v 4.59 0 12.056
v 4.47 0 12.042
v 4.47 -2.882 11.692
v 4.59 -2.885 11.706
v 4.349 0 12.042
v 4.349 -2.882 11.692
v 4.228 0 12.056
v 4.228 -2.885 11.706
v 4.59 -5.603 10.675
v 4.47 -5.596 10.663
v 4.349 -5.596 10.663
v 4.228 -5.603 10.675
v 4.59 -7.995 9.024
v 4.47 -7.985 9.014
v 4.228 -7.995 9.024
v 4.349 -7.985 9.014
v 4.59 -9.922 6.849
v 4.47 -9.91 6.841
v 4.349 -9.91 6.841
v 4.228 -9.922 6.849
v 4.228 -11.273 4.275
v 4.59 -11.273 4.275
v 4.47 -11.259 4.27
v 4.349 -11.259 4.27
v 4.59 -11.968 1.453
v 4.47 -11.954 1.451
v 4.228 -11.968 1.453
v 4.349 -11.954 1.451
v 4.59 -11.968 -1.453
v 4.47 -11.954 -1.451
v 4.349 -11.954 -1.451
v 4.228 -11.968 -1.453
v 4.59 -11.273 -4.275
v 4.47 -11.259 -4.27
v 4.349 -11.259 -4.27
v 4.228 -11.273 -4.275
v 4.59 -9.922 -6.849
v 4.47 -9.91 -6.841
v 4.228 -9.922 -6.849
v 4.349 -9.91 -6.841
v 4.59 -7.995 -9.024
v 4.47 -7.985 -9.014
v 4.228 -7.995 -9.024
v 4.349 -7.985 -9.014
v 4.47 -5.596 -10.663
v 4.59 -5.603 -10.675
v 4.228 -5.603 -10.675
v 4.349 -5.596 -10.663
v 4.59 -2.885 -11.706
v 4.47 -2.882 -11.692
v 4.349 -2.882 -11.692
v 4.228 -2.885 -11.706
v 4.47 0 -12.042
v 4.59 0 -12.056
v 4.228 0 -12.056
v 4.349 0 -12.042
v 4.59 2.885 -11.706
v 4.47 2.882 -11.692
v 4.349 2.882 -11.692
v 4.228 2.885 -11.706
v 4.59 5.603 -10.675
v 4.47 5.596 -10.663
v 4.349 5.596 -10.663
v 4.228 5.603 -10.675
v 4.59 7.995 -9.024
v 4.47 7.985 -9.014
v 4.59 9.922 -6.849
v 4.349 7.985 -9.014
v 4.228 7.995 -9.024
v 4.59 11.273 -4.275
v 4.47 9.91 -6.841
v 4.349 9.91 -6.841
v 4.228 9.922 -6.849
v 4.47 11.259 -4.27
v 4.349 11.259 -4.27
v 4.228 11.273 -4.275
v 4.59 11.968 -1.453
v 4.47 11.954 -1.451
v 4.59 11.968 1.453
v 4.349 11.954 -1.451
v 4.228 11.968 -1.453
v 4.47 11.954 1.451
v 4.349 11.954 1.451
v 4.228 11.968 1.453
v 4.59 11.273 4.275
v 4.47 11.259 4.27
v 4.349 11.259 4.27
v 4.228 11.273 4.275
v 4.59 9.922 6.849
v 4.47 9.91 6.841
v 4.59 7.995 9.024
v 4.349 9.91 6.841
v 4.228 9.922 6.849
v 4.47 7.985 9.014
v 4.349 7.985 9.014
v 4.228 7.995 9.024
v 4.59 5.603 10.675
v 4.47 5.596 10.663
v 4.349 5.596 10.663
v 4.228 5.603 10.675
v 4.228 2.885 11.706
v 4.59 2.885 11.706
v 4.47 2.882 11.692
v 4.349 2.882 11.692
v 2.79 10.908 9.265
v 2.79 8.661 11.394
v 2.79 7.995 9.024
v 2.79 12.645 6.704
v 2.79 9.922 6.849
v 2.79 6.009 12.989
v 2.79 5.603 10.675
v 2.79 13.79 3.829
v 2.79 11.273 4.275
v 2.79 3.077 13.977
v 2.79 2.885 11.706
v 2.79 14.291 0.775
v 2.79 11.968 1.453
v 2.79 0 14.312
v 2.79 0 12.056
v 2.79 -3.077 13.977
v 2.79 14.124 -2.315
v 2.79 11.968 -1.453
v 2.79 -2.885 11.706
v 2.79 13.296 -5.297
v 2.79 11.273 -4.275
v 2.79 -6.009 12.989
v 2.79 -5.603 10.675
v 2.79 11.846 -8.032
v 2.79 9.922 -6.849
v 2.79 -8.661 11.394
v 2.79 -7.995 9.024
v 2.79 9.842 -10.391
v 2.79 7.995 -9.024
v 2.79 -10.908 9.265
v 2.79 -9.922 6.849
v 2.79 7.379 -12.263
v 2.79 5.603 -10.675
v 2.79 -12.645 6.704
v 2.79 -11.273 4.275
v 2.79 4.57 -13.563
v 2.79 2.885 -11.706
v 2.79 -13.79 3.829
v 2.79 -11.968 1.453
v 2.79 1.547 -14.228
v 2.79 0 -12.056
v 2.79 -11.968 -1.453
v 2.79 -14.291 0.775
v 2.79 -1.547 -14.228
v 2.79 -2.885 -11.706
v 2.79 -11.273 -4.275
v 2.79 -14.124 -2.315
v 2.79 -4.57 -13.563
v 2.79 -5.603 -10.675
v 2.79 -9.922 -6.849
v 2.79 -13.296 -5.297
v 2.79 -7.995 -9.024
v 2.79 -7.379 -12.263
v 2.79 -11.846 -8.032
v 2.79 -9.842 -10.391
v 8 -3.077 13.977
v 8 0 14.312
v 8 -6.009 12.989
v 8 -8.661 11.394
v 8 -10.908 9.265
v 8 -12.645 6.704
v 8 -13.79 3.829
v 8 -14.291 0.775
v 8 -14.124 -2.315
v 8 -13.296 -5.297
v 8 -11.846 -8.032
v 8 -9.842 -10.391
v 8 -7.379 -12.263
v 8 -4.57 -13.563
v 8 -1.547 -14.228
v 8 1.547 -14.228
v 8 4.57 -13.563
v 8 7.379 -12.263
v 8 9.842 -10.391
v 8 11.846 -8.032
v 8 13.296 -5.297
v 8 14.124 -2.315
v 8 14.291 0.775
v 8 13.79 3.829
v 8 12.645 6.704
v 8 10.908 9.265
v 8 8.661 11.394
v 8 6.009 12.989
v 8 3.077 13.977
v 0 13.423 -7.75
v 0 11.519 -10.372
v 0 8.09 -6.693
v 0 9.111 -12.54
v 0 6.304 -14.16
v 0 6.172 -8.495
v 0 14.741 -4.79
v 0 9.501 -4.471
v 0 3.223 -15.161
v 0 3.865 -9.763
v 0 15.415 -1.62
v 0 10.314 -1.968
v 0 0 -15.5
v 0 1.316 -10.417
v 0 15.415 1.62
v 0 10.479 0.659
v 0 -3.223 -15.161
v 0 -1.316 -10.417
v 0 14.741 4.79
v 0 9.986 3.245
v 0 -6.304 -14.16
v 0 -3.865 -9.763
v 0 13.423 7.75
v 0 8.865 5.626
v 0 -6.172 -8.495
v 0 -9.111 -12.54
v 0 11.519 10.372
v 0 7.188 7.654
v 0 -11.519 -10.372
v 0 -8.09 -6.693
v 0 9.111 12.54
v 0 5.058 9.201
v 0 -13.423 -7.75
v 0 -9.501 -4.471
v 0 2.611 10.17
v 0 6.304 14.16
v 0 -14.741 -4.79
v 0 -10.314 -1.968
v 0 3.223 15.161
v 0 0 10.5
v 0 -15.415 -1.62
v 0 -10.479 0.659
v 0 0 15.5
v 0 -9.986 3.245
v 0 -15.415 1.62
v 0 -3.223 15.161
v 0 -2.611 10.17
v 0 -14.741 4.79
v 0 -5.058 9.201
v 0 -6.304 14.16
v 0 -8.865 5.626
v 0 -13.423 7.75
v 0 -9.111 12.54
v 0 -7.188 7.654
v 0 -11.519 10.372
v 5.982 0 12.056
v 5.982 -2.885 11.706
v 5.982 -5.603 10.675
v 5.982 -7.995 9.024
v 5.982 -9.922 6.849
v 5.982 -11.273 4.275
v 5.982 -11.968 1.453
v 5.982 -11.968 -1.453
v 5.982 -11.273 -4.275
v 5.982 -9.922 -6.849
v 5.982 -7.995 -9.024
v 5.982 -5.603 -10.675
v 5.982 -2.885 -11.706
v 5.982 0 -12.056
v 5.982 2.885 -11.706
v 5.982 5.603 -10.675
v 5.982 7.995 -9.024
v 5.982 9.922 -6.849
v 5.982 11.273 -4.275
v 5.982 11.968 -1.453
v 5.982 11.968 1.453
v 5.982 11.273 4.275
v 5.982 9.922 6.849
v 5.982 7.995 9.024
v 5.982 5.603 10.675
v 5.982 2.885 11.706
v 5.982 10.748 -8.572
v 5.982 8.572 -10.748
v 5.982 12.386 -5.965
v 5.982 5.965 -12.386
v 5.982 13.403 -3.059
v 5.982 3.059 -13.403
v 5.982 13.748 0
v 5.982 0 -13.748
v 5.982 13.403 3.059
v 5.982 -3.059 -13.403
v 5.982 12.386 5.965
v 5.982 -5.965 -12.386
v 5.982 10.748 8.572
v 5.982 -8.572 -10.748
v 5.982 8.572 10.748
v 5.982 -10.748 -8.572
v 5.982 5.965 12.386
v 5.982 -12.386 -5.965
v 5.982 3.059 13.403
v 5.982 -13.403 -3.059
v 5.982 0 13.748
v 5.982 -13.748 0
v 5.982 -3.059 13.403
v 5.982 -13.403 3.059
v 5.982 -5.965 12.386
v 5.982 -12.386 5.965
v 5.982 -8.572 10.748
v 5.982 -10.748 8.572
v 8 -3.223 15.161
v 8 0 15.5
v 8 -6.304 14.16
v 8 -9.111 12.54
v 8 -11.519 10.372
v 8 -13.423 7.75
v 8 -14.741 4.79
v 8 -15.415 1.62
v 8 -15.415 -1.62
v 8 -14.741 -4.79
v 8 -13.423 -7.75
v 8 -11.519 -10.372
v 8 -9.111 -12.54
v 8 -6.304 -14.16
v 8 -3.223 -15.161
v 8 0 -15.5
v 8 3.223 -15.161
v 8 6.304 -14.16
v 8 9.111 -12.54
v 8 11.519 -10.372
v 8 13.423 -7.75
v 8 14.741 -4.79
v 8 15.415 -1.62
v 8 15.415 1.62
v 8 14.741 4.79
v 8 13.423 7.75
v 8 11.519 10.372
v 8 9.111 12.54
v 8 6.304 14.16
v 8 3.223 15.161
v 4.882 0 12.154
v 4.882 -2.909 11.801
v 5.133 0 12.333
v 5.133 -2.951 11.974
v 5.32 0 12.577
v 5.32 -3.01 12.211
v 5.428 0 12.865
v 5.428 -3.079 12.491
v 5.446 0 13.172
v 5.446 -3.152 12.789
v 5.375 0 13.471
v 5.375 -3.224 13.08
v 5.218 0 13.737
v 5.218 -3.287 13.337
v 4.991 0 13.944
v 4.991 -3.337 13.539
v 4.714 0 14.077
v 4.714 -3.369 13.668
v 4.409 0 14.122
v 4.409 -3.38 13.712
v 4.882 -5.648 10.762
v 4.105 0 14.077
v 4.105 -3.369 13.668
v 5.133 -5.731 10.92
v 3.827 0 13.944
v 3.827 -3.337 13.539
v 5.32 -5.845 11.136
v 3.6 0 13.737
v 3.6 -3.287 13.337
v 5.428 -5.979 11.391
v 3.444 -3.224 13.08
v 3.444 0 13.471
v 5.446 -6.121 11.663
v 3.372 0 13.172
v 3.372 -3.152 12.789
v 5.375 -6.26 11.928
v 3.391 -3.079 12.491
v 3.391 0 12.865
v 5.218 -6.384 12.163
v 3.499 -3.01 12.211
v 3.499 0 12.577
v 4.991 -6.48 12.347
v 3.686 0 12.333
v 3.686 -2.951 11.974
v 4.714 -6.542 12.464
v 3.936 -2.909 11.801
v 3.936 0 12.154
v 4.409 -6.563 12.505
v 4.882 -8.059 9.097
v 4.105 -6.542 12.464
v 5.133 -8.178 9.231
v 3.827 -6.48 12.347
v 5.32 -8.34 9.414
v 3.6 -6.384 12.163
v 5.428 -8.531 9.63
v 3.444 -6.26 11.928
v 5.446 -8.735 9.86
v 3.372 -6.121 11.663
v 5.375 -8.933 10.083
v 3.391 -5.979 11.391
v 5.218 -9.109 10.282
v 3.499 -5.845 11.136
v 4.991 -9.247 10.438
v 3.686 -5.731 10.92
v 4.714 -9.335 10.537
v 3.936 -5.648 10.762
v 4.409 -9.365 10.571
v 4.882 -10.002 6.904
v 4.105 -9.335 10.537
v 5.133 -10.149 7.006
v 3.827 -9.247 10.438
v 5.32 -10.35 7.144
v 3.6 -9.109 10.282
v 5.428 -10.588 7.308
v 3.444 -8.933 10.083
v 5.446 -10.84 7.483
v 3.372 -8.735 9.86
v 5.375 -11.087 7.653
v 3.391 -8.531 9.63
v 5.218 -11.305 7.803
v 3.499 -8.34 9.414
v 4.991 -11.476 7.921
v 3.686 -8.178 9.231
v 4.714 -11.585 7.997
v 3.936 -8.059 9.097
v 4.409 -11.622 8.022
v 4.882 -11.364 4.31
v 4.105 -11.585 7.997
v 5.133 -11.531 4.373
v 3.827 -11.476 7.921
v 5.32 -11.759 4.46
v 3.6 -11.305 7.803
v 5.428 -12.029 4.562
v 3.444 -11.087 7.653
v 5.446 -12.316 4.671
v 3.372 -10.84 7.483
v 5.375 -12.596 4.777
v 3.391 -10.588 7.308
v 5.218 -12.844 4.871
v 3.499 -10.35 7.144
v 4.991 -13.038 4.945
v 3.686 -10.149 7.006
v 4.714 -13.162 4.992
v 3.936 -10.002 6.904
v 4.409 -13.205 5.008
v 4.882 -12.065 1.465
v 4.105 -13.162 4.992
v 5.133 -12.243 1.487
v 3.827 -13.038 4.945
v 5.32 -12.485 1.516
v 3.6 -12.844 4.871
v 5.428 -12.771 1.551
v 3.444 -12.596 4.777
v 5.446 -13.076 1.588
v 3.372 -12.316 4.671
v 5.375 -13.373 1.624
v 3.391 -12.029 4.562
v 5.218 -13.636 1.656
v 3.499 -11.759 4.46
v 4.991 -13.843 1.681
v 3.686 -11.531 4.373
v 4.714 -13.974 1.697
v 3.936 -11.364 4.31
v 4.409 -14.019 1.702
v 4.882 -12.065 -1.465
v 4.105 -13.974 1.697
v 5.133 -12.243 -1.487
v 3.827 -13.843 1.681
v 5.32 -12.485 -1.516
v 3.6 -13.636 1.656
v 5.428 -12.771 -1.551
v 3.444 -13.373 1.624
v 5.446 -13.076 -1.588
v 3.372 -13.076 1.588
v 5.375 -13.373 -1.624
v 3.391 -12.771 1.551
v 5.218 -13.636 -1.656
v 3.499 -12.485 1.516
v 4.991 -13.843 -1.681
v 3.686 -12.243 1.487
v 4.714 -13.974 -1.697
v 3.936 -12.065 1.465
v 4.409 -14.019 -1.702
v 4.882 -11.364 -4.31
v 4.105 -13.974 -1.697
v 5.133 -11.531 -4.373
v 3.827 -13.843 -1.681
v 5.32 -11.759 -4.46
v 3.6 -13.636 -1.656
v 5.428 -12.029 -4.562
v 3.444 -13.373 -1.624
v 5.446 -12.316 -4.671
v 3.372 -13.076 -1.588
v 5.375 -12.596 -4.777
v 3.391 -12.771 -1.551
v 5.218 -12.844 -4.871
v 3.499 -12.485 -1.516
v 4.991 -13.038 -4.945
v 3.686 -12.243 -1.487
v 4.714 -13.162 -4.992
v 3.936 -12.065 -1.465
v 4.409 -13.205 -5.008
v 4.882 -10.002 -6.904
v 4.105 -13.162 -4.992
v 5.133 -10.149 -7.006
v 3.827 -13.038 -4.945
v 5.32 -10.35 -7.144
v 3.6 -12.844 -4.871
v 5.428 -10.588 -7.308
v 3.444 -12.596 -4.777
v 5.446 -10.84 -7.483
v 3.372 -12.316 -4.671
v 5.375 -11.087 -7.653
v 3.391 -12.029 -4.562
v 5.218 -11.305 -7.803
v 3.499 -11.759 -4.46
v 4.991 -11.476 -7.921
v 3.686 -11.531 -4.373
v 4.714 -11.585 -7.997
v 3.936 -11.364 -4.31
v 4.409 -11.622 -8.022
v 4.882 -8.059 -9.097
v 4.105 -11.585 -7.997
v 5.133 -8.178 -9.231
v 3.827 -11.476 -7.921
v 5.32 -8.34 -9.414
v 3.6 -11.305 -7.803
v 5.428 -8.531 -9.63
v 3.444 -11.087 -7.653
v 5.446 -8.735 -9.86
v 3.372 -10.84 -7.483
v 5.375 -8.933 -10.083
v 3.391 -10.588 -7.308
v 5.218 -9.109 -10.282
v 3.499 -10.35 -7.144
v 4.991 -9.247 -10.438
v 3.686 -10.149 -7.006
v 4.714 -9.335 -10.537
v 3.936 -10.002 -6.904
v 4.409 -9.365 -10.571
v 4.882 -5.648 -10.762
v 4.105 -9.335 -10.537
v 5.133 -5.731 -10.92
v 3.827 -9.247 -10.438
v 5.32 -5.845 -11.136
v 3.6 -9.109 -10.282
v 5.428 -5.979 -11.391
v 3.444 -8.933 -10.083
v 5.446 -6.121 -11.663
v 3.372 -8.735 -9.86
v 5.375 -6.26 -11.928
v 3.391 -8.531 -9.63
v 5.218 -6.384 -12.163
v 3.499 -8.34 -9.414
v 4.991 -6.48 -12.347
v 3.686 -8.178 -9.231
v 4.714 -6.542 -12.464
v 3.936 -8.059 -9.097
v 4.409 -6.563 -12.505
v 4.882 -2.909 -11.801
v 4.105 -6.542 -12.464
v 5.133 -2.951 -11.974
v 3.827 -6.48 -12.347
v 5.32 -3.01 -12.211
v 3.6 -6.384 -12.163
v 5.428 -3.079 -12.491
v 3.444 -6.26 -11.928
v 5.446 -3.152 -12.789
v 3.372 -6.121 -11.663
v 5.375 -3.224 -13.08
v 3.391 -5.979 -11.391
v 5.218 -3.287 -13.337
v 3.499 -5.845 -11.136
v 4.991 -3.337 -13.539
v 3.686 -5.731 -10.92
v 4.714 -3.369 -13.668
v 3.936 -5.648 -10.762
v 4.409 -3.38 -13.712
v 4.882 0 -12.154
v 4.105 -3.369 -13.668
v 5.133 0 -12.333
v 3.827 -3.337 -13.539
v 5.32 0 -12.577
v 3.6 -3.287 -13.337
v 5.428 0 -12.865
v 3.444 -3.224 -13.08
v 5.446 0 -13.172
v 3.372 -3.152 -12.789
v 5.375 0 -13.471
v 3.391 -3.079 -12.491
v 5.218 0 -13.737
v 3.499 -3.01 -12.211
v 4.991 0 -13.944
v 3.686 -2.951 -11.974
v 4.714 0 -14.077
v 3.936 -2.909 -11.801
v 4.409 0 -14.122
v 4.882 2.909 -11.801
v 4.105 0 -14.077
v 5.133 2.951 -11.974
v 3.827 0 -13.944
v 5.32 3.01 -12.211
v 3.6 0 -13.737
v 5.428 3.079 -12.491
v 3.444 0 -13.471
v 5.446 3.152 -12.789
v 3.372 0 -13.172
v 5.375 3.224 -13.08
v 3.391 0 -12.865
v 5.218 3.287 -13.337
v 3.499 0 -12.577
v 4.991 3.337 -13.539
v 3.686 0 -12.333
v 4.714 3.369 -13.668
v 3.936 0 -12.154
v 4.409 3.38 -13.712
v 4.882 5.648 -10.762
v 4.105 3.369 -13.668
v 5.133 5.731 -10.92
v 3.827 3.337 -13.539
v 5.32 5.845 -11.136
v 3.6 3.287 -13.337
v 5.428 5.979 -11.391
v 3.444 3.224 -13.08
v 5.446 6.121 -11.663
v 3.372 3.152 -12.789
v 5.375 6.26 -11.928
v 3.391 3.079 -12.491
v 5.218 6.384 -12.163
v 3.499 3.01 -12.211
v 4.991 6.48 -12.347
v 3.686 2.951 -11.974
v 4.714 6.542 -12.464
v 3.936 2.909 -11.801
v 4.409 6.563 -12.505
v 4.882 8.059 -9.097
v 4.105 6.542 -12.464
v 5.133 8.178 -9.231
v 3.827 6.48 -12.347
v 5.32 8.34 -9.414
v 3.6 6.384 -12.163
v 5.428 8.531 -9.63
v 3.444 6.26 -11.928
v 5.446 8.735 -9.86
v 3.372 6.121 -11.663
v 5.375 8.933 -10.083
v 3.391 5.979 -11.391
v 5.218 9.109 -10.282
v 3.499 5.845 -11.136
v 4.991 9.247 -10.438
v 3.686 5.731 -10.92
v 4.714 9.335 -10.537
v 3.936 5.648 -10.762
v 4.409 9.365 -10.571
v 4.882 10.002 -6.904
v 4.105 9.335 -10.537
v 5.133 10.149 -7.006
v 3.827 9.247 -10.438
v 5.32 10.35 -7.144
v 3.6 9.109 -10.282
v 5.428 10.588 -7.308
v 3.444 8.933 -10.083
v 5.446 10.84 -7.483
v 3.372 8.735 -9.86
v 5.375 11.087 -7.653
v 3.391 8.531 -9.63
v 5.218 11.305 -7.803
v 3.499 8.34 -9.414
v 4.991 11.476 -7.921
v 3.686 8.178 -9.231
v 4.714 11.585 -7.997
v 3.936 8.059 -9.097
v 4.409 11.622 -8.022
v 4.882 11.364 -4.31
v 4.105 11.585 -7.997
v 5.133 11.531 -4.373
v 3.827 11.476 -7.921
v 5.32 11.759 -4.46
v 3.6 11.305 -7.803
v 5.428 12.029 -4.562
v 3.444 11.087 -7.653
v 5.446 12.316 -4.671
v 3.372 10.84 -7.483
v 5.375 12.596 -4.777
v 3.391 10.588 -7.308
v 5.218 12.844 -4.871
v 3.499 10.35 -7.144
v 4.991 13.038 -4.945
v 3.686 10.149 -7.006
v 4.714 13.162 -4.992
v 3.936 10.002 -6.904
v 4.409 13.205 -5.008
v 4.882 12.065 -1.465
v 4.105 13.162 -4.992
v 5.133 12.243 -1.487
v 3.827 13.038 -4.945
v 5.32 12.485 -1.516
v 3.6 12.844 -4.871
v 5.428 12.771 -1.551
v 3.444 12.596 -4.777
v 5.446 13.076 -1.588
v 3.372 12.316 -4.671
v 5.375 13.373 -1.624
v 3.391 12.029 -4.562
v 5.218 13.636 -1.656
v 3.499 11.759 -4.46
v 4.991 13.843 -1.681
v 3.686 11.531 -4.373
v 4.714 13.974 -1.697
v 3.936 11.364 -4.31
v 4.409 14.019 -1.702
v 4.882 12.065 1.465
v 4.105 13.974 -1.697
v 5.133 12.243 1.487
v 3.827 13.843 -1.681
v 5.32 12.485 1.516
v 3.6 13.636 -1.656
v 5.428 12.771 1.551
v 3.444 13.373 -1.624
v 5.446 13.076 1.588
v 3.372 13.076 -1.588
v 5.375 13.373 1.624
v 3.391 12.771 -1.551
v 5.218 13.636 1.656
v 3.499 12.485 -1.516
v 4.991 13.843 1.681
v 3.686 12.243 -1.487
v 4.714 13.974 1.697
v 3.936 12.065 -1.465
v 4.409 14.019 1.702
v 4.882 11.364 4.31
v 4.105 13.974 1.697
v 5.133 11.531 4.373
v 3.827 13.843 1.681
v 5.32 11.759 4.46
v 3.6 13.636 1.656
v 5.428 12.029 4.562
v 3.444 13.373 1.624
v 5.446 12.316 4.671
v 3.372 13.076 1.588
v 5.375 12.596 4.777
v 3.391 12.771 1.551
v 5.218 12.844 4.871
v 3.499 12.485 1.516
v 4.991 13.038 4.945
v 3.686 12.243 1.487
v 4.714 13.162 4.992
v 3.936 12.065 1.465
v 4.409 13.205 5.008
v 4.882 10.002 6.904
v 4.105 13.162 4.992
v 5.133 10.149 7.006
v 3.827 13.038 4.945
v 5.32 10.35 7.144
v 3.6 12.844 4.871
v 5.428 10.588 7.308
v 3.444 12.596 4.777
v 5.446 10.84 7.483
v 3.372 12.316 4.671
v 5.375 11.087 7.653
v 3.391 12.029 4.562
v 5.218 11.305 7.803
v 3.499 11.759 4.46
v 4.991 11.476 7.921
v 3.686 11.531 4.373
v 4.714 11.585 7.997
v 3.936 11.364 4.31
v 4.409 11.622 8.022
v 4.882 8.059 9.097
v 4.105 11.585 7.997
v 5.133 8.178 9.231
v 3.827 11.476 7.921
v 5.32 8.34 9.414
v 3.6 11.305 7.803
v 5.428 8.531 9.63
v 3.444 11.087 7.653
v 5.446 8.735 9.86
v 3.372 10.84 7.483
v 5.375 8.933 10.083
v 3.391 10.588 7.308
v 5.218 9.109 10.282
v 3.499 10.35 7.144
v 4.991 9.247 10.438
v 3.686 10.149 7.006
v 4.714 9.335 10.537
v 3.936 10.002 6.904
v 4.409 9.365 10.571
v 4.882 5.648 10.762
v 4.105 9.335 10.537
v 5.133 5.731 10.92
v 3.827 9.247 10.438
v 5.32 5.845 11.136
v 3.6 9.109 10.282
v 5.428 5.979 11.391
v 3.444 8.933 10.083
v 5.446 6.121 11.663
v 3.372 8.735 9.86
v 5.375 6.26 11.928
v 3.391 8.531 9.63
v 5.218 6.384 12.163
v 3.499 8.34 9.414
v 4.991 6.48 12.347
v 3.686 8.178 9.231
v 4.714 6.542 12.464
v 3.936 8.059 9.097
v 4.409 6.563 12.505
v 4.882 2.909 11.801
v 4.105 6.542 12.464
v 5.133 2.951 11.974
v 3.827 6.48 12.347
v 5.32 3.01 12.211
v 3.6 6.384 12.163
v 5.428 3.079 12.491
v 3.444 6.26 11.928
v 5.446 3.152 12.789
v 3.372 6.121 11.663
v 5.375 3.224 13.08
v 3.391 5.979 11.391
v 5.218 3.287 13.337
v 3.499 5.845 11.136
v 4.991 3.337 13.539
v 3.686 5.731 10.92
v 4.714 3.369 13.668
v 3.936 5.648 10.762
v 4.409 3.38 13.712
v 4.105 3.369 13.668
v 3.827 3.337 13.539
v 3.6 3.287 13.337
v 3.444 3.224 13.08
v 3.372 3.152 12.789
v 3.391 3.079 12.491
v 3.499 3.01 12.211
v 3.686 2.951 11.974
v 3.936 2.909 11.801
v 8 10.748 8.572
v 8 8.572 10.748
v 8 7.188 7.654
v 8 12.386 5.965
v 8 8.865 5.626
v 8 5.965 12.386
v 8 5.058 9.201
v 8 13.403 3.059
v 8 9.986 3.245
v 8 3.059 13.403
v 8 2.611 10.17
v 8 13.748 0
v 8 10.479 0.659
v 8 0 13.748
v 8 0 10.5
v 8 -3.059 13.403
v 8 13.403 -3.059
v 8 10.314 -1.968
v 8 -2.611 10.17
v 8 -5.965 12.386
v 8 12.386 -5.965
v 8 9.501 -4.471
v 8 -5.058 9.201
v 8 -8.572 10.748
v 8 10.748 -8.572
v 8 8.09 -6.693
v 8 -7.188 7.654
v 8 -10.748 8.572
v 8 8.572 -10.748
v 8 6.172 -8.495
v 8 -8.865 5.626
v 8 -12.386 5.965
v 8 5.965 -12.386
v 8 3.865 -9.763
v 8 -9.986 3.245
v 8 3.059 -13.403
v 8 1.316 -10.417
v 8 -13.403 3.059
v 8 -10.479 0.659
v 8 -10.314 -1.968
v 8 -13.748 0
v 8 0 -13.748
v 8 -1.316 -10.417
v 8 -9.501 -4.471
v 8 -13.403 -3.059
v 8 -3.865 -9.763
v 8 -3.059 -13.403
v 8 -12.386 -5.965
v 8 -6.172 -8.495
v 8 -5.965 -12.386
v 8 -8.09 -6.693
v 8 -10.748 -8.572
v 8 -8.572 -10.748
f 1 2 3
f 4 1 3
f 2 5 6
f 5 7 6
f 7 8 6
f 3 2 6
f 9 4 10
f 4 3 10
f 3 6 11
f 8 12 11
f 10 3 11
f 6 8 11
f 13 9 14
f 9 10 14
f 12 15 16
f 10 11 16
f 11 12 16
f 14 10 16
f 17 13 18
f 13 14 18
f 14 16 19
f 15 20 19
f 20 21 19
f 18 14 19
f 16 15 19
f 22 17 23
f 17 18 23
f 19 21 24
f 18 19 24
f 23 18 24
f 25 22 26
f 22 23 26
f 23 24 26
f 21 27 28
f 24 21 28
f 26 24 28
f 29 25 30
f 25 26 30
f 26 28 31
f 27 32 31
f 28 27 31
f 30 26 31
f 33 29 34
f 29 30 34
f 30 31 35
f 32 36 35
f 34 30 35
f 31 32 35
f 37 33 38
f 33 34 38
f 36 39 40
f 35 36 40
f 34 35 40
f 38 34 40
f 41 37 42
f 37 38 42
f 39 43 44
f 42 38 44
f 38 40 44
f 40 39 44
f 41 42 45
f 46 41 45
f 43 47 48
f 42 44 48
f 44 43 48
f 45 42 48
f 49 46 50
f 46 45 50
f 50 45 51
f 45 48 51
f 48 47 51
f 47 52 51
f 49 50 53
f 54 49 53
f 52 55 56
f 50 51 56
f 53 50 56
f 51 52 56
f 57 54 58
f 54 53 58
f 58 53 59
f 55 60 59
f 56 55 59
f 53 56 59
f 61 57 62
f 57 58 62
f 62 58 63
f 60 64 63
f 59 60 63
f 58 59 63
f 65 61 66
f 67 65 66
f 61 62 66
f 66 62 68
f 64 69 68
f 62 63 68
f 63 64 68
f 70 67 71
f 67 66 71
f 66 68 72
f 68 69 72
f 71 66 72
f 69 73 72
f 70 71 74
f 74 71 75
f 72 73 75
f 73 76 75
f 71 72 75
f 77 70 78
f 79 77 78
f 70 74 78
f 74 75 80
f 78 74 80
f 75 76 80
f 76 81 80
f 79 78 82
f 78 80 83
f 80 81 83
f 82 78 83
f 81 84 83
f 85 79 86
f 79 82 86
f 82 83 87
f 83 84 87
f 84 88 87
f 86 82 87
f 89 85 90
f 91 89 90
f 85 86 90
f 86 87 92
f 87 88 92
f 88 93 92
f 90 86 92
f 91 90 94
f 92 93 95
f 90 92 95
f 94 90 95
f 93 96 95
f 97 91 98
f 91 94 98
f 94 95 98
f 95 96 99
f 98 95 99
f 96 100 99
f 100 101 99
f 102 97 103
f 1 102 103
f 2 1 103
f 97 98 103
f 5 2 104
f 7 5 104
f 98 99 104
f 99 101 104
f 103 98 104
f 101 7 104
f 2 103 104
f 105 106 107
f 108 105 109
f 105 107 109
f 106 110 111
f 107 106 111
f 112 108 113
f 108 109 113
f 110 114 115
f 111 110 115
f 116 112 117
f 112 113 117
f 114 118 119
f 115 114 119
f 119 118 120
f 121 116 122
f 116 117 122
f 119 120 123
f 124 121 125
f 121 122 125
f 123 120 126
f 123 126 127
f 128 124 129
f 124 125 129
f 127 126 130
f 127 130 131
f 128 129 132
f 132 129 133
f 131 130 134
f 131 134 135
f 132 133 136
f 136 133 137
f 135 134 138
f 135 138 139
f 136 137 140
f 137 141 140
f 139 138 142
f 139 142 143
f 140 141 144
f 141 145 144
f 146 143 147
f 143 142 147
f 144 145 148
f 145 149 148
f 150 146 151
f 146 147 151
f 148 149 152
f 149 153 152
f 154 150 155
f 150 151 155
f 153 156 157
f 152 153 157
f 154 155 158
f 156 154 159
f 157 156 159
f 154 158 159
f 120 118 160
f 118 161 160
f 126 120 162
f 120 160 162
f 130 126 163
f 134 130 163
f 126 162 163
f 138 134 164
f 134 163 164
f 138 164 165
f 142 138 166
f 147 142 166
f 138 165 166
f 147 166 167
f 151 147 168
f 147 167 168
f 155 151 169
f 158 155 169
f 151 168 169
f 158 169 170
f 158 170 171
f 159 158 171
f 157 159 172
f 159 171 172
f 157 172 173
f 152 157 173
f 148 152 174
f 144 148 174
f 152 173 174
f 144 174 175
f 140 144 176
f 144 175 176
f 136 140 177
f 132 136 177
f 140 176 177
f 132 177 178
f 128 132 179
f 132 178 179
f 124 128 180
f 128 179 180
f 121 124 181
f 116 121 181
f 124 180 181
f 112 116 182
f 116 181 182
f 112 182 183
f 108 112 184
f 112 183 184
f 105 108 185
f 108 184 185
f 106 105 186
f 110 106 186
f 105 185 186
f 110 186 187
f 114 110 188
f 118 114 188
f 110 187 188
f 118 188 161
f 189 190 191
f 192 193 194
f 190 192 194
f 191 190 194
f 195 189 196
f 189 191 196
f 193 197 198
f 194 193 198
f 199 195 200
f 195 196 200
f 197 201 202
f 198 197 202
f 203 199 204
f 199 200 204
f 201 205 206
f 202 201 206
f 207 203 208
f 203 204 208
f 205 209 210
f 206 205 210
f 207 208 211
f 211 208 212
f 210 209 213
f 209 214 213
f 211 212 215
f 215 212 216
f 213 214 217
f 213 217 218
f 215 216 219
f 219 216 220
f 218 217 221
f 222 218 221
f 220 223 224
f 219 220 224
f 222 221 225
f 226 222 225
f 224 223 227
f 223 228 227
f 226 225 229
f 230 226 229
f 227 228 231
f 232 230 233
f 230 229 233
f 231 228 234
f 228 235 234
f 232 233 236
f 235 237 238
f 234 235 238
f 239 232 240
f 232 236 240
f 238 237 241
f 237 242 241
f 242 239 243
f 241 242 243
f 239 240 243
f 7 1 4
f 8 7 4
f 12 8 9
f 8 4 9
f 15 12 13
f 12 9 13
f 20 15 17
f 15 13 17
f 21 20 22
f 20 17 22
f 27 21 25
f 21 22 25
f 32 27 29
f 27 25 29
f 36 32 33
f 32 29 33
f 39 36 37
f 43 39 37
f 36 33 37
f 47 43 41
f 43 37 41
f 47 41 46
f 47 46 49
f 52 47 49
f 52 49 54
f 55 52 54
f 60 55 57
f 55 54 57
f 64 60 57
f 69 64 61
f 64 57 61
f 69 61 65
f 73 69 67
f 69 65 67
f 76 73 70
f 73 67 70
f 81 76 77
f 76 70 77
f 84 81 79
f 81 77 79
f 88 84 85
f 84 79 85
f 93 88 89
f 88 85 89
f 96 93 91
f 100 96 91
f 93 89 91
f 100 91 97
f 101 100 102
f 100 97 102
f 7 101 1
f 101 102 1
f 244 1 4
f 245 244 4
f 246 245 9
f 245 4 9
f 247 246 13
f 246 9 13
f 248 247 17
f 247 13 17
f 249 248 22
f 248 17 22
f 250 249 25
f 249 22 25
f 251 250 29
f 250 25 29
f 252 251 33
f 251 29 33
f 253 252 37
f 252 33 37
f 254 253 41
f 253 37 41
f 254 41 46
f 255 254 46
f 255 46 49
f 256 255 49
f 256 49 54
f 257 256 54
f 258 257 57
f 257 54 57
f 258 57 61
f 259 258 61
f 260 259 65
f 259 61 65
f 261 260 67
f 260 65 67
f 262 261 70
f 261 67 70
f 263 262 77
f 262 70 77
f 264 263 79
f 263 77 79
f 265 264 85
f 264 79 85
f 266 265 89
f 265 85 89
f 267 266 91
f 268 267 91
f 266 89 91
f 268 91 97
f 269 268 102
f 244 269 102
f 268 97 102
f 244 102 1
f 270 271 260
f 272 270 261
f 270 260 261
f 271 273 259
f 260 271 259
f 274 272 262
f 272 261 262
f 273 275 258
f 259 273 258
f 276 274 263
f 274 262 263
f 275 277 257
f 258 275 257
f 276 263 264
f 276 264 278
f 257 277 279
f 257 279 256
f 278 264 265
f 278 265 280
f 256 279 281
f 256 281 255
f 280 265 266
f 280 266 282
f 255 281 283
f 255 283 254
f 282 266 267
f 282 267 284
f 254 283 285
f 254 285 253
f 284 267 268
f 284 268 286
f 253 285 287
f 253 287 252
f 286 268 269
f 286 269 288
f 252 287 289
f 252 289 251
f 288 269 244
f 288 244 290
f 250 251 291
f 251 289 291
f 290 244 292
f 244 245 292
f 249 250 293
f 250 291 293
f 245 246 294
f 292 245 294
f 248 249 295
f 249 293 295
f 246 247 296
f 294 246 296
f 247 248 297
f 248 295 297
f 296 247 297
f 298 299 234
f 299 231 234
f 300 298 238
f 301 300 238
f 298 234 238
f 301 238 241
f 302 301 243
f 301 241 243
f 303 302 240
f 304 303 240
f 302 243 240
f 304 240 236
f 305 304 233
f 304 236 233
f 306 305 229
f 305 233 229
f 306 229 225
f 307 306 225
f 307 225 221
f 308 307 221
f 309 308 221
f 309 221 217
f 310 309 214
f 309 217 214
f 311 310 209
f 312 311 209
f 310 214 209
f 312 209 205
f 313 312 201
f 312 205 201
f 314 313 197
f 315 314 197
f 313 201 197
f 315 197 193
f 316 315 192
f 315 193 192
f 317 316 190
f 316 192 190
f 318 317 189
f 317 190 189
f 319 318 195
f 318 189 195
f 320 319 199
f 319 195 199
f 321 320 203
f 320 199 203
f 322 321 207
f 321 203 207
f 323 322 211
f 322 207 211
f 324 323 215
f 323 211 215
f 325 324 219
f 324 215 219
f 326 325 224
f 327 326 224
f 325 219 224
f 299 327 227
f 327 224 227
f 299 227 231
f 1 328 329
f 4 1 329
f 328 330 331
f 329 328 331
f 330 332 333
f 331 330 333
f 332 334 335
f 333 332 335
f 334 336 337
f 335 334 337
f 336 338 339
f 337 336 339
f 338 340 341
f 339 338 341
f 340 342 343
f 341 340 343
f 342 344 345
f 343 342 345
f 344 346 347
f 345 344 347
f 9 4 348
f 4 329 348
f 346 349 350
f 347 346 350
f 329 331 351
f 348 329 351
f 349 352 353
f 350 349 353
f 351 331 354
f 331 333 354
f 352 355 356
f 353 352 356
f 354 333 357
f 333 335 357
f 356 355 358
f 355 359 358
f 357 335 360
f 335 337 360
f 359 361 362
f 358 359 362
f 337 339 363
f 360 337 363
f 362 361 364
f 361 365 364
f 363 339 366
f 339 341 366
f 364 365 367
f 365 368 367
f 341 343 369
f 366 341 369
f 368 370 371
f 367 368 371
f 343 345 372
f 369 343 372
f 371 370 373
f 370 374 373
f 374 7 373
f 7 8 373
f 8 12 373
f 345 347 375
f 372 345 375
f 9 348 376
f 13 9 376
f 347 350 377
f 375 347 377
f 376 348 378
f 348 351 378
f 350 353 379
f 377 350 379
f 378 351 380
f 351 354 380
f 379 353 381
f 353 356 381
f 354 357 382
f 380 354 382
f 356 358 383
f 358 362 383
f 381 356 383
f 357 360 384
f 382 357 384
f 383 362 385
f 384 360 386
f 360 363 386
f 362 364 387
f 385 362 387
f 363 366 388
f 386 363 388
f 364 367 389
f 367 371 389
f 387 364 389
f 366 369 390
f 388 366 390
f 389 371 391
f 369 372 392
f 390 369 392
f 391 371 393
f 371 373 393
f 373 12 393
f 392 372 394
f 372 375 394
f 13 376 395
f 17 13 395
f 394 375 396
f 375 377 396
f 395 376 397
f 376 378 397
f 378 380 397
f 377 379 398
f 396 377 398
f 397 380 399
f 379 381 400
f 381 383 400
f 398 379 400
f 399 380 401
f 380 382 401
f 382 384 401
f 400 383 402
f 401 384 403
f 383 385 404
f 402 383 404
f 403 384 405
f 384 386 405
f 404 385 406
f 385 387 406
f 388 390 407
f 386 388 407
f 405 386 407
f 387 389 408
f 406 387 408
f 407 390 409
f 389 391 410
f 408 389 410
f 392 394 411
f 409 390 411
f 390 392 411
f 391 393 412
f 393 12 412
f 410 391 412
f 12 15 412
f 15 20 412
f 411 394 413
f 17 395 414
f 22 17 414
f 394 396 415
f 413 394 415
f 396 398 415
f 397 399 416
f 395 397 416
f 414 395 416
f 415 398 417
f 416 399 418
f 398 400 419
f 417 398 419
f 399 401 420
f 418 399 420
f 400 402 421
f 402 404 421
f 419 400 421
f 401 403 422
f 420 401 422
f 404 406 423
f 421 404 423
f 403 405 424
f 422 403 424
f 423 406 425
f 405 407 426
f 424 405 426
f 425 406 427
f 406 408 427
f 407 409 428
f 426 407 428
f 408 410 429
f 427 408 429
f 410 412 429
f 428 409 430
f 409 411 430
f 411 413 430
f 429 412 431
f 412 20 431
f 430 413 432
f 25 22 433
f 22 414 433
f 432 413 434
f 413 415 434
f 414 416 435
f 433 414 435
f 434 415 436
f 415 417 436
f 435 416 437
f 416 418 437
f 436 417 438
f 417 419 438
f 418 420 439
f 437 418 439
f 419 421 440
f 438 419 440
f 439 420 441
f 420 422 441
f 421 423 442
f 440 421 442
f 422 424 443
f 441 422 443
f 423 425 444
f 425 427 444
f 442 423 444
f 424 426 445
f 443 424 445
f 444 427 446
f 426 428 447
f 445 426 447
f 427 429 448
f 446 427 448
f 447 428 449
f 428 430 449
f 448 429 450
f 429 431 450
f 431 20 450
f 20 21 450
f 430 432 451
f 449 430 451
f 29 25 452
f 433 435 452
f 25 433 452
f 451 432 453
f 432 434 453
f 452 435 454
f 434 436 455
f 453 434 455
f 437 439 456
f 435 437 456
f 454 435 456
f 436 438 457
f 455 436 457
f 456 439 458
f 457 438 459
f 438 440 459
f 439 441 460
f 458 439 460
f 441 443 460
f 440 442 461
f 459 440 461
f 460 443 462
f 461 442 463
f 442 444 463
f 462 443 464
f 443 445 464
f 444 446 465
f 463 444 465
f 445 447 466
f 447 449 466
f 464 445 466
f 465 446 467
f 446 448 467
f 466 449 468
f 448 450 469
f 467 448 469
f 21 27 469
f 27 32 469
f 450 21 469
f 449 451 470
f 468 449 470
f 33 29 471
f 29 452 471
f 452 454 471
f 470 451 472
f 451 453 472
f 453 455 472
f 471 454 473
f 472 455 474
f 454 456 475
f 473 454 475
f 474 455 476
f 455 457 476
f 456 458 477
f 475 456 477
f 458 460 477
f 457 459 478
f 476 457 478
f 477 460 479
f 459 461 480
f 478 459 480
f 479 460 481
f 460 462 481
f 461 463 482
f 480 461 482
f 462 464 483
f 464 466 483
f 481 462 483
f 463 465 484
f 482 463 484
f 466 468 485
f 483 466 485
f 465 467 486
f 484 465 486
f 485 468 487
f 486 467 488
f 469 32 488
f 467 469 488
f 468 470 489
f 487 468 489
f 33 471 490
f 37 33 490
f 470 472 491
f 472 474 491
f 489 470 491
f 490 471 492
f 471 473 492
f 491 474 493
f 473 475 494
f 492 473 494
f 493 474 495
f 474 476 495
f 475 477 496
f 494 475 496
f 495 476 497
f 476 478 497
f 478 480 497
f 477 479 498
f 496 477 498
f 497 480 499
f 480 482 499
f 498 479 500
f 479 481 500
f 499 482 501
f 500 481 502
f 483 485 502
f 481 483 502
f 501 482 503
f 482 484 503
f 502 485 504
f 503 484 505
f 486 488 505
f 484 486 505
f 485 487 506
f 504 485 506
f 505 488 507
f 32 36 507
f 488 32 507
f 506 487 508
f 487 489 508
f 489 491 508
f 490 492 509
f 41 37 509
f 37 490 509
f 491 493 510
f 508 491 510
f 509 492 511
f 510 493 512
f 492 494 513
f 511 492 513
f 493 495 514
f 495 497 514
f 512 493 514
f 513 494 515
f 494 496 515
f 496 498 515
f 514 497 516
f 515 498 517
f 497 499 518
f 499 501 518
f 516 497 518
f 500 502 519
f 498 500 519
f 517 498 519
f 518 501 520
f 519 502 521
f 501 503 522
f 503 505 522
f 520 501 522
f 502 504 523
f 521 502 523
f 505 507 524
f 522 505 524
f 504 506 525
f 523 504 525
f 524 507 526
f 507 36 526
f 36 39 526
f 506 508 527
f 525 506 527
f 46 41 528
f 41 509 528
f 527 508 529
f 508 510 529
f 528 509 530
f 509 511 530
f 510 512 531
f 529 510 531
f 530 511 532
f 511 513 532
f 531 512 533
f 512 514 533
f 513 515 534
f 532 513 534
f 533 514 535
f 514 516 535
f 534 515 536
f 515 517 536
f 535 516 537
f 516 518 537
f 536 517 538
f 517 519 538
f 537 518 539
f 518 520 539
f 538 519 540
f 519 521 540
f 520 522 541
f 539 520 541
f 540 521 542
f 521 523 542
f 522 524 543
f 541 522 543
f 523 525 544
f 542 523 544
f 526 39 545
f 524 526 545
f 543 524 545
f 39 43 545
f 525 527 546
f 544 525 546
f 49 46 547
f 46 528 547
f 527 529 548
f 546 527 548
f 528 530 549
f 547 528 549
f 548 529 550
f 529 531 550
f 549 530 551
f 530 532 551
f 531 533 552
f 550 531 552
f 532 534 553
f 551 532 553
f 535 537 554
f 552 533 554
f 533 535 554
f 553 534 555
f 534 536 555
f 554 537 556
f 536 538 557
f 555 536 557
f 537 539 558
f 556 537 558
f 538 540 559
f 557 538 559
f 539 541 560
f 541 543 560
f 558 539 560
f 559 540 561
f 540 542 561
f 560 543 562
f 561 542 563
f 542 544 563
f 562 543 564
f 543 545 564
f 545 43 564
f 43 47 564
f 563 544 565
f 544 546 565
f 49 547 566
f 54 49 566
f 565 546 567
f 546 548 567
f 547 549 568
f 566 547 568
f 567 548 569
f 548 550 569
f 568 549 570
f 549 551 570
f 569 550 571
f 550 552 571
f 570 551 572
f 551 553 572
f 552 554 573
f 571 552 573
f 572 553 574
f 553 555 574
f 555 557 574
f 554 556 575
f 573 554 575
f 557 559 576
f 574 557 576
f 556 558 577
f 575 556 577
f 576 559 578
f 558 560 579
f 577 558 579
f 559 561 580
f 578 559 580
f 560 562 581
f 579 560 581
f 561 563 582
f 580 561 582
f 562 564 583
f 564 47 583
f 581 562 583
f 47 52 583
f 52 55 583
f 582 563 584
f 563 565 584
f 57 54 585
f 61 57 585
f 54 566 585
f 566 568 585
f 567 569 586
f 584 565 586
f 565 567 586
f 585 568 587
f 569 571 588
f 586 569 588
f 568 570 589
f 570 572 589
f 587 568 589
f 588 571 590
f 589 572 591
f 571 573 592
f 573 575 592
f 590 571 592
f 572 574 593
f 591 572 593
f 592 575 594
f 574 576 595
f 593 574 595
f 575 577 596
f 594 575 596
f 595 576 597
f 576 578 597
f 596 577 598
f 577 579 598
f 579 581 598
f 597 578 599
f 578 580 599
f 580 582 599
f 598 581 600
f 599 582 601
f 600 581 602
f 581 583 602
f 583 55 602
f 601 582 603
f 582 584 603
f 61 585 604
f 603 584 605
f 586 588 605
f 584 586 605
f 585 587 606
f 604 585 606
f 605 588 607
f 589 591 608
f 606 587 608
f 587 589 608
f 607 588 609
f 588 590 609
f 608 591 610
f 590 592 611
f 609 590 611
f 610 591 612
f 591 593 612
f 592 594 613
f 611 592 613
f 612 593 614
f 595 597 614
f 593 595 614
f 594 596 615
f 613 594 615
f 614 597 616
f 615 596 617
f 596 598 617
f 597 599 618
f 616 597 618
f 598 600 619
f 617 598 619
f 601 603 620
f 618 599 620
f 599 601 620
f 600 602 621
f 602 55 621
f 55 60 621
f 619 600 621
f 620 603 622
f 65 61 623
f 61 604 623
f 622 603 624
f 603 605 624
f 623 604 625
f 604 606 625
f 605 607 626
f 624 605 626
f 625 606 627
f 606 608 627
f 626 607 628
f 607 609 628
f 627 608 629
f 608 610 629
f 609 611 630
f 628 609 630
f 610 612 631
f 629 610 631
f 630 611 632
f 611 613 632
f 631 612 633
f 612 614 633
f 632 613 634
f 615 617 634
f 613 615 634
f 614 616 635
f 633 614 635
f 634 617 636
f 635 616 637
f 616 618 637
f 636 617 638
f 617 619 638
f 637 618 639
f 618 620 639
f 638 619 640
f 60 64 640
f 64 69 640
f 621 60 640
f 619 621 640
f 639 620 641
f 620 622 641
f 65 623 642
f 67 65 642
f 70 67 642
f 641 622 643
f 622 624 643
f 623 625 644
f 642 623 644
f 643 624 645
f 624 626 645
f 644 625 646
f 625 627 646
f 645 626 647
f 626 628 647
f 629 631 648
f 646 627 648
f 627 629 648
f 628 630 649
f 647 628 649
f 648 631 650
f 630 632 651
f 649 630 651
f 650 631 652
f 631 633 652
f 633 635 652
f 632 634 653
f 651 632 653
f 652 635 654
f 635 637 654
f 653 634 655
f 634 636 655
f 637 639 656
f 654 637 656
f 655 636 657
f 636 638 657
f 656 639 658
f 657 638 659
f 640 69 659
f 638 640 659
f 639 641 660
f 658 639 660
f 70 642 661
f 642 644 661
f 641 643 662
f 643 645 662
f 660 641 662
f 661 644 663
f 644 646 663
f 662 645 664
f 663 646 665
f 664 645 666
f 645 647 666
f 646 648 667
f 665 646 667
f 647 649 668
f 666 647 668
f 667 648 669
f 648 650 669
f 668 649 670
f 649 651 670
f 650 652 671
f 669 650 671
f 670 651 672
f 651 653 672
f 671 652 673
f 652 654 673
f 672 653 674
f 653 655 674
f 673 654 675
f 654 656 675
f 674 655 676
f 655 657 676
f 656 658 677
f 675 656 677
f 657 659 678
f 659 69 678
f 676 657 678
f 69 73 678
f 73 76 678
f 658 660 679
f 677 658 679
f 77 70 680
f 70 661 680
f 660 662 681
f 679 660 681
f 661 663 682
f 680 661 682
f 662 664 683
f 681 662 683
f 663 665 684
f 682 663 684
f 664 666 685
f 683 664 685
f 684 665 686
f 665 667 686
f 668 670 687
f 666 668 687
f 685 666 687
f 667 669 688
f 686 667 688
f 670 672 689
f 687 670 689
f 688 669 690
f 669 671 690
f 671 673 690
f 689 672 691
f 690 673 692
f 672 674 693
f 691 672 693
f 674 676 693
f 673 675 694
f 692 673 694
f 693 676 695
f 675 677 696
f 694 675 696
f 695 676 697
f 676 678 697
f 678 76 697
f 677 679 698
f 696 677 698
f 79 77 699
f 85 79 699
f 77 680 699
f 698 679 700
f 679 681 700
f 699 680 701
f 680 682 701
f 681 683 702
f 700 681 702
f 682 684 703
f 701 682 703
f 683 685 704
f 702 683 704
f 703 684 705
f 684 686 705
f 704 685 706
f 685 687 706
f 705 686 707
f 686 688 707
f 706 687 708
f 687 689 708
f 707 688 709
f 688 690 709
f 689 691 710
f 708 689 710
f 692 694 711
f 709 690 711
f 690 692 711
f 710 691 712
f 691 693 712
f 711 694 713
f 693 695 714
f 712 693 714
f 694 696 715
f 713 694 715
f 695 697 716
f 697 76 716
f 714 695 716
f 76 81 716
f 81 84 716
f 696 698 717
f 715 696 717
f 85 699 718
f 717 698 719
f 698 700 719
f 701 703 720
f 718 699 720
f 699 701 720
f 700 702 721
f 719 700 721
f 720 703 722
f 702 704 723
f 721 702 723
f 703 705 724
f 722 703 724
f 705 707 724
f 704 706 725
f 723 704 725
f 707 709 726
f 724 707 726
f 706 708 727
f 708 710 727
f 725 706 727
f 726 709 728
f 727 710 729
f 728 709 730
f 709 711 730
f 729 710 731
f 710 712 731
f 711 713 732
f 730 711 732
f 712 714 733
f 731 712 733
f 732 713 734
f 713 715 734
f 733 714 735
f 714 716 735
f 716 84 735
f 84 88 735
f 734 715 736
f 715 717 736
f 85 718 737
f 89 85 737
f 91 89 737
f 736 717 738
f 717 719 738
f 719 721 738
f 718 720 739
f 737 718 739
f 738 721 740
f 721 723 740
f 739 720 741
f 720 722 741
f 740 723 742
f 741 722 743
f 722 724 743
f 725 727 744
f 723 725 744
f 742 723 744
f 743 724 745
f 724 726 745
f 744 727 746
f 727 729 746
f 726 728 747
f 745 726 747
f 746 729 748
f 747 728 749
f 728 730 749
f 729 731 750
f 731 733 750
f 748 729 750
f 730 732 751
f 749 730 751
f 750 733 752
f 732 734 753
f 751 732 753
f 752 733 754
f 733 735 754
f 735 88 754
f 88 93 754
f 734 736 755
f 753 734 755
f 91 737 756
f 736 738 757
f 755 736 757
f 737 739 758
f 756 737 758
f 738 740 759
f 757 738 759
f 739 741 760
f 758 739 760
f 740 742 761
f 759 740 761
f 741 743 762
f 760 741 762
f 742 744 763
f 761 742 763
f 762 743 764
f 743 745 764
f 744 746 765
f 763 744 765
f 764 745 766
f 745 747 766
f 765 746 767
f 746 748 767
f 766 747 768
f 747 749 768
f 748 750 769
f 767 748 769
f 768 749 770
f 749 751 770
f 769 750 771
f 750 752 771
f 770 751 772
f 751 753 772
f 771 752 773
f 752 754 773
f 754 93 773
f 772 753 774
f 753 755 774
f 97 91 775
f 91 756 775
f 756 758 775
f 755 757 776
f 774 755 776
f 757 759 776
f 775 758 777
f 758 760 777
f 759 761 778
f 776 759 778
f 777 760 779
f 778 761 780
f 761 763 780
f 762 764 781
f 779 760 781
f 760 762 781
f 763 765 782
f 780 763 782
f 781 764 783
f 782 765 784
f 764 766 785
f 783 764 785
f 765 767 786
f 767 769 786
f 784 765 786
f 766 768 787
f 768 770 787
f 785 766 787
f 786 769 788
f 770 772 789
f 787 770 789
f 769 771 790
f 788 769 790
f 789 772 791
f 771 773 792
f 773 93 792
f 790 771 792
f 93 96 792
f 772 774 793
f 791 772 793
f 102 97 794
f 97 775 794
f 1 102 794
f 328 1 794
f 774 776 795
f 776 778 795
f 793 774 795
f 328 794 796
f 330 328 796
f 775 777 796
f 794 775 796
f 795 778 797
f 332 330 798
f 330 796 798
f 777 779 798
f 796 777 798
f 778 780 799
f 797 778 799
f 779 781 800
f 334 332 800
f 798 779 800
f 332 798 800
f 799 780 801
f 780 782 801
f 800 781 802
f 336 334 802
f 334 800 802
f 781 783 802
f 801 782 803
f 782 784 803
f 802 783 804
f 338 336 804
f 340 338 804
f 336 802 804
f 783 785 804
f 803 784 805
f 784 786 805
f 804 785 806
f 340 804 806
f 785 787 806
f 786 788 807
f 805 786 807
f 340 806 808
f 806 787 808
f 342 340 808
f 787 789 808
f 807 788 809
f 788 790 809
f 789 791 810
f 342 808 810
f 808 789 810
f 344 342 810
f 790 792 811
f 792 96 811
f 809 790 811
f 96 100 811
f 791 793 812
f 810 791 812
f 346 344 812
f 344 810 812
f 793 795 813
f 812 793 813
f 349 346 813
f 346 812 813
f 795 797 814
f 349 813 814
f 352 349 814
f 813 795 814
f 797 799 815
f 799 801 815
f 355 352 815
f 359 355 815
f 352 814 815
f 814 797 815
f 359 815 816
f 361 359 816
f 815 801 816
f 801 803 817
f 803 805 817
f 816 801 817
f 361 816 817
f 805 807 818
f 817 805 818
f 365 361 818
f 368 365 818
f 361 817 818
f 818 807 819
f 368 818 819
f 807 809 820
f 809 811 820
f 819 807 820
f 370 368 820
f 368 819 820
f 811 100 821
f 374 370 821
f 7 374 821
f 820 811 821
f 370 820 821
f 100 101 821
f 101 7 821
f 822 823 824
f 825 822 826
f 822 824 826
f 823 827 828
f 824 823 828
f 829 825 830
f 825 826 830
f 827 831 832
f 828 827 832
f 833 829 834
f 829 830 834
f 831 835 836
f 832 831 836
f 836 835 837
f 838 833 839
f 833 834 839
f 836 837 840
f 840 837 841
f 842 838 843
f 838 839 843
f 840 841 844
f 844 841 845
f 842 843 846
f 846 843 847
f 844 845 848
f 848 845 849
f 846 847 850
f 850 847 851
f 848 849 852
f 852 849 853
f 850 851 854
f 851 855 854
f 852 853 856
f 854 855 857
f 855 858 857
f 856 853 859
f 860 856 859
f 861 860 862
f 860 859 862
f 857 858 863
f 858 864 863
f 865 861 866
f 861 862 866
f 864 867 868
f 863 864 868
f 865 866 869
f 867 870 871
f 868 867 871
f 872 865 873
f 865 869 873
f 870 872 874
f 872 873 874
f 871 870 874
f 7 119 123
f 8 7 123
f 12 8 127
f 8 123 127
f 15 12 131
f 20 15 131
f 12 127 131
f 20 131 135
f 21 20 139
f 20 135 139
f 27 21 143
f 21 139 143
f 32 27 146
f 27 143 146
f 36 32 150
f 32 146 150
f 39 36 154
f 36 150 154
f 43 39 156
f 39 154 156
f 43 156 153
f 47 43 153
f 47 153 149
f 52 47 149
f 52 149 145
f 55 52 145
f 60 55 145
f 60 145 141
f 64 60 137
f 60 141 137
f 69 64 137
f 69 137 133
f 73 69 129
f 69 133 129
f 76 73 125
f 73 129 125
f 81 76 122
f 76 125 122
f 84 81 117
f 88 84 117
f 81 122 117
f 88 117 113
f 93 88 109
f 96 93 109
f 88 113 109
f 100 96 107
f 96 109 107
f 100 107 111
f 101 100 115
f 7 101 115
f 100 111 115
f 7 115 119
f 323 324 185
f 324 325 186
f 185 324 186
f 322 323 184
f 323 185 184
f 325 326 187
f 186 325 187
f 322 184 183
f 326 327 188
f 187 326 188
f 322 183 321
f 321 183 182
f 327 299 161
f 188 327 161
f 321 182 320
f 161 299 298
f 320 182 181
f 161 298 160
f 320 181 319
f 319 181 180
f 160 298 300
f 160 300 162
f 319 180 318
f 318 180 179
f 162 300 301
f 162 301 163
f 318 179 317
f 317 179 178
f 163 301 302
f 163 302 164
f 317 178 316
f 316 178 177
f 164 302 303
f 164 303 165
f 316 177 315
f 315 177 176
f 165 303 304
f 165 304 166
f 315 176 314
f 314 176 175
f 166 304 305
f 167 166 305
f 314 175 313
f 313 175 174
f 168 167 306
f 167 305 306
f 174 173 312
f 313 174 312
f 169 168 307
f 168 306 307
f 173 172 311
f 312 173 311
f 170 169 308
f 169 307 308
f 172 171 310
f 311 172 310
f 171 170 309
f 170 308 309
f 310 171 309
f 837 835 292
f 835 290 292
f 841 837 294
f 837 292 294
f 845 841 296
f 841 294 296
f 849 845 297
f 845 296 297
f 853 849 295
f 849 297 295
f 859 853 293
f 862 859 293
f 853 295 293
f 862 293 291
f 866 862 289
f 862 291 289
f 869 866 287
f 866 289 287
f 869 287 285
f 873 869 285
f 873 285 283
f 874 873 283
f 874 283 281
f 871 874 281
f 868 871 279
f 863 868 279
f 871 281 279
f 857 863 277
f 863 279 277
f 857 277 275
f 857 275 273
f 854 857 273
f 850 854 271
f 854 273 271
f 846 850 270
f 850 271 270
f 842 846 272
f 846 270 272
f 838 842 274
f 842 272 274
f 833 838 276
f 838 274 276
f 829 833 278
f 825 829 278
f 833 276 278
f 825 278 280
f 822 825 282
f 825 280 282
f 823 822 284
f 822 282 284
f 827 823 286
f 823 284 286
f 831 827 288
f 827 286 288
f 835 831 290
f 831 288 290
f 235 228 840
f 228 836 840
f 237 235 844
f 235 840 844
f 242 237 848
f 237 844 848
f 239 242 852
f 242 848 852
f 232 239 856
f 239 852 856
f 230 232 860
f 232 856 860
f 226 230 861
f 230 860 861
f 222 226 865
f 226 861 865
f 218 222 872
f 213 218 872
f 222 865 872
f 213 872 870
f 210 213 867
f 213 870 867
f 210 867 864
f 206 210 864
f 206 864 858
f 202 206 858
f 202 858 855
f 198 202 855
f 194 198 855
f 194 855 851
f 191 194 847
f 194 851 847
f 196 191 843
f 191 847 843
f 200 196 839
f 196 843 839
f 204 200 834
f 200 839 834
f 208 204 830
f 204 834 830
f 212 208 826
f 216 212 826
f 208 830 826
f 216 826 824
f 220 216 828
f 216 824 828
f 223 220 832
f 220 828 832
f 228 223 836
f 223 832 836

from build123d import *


with BuildPart() as part:
    # 草图1 → 旋转2 (revolve)
    with BuildSketch(Plane.XY, mode=Mode.PRIVATE) as revolve_2_sk:
        with BuildLine():
            Line((0, 15.5), (0, 10.5))
            Line((0, 10.5), (8, 10.5))
            Line((8, 10.5), (8, 13.74763638))
            Line((8, 13.74763638), (5.982258283, 13.74763638))
            Line((5.982258283, 13.74763638), (5.982258283, 12.056029289))
            Line((5.982258283, 12.056029289), (4.590479573, 12.056029289))
            ThreePointArc((4.590479573, 12.056029289), (4.409304115, 12.040143863), (4.228128656, 12.056029289))
            Line((4.228128656, 12.056029289), (2.789681799, 12.056029289))
            Line((2.789681799, 12.056029289), (2.789681799, 14.312073179))
            Line((2.789681799, 14.312073179), (8, 14.312073179))
            Line((8, 14.312073179), (8, 15.5))
            Line((8, 15.5), (0, 15.5))
        make_face()
        with BuildLine():
            Line((4.228128656, 12.056029289), (4.590479573, 12.056029289))
            ThreePointArc((4.590479573, 12.056029289), (4.409304115, 14.122360164), (4.228128656, 12.056029289))
        make_face()
    revolve(revolve_2_sk.sketch.rotate(Axis((0, 0, 0), (1, 0, 0)), 90), axis=Axis((0, 0, 0), (1, 0, 0)))


solid = part.part
